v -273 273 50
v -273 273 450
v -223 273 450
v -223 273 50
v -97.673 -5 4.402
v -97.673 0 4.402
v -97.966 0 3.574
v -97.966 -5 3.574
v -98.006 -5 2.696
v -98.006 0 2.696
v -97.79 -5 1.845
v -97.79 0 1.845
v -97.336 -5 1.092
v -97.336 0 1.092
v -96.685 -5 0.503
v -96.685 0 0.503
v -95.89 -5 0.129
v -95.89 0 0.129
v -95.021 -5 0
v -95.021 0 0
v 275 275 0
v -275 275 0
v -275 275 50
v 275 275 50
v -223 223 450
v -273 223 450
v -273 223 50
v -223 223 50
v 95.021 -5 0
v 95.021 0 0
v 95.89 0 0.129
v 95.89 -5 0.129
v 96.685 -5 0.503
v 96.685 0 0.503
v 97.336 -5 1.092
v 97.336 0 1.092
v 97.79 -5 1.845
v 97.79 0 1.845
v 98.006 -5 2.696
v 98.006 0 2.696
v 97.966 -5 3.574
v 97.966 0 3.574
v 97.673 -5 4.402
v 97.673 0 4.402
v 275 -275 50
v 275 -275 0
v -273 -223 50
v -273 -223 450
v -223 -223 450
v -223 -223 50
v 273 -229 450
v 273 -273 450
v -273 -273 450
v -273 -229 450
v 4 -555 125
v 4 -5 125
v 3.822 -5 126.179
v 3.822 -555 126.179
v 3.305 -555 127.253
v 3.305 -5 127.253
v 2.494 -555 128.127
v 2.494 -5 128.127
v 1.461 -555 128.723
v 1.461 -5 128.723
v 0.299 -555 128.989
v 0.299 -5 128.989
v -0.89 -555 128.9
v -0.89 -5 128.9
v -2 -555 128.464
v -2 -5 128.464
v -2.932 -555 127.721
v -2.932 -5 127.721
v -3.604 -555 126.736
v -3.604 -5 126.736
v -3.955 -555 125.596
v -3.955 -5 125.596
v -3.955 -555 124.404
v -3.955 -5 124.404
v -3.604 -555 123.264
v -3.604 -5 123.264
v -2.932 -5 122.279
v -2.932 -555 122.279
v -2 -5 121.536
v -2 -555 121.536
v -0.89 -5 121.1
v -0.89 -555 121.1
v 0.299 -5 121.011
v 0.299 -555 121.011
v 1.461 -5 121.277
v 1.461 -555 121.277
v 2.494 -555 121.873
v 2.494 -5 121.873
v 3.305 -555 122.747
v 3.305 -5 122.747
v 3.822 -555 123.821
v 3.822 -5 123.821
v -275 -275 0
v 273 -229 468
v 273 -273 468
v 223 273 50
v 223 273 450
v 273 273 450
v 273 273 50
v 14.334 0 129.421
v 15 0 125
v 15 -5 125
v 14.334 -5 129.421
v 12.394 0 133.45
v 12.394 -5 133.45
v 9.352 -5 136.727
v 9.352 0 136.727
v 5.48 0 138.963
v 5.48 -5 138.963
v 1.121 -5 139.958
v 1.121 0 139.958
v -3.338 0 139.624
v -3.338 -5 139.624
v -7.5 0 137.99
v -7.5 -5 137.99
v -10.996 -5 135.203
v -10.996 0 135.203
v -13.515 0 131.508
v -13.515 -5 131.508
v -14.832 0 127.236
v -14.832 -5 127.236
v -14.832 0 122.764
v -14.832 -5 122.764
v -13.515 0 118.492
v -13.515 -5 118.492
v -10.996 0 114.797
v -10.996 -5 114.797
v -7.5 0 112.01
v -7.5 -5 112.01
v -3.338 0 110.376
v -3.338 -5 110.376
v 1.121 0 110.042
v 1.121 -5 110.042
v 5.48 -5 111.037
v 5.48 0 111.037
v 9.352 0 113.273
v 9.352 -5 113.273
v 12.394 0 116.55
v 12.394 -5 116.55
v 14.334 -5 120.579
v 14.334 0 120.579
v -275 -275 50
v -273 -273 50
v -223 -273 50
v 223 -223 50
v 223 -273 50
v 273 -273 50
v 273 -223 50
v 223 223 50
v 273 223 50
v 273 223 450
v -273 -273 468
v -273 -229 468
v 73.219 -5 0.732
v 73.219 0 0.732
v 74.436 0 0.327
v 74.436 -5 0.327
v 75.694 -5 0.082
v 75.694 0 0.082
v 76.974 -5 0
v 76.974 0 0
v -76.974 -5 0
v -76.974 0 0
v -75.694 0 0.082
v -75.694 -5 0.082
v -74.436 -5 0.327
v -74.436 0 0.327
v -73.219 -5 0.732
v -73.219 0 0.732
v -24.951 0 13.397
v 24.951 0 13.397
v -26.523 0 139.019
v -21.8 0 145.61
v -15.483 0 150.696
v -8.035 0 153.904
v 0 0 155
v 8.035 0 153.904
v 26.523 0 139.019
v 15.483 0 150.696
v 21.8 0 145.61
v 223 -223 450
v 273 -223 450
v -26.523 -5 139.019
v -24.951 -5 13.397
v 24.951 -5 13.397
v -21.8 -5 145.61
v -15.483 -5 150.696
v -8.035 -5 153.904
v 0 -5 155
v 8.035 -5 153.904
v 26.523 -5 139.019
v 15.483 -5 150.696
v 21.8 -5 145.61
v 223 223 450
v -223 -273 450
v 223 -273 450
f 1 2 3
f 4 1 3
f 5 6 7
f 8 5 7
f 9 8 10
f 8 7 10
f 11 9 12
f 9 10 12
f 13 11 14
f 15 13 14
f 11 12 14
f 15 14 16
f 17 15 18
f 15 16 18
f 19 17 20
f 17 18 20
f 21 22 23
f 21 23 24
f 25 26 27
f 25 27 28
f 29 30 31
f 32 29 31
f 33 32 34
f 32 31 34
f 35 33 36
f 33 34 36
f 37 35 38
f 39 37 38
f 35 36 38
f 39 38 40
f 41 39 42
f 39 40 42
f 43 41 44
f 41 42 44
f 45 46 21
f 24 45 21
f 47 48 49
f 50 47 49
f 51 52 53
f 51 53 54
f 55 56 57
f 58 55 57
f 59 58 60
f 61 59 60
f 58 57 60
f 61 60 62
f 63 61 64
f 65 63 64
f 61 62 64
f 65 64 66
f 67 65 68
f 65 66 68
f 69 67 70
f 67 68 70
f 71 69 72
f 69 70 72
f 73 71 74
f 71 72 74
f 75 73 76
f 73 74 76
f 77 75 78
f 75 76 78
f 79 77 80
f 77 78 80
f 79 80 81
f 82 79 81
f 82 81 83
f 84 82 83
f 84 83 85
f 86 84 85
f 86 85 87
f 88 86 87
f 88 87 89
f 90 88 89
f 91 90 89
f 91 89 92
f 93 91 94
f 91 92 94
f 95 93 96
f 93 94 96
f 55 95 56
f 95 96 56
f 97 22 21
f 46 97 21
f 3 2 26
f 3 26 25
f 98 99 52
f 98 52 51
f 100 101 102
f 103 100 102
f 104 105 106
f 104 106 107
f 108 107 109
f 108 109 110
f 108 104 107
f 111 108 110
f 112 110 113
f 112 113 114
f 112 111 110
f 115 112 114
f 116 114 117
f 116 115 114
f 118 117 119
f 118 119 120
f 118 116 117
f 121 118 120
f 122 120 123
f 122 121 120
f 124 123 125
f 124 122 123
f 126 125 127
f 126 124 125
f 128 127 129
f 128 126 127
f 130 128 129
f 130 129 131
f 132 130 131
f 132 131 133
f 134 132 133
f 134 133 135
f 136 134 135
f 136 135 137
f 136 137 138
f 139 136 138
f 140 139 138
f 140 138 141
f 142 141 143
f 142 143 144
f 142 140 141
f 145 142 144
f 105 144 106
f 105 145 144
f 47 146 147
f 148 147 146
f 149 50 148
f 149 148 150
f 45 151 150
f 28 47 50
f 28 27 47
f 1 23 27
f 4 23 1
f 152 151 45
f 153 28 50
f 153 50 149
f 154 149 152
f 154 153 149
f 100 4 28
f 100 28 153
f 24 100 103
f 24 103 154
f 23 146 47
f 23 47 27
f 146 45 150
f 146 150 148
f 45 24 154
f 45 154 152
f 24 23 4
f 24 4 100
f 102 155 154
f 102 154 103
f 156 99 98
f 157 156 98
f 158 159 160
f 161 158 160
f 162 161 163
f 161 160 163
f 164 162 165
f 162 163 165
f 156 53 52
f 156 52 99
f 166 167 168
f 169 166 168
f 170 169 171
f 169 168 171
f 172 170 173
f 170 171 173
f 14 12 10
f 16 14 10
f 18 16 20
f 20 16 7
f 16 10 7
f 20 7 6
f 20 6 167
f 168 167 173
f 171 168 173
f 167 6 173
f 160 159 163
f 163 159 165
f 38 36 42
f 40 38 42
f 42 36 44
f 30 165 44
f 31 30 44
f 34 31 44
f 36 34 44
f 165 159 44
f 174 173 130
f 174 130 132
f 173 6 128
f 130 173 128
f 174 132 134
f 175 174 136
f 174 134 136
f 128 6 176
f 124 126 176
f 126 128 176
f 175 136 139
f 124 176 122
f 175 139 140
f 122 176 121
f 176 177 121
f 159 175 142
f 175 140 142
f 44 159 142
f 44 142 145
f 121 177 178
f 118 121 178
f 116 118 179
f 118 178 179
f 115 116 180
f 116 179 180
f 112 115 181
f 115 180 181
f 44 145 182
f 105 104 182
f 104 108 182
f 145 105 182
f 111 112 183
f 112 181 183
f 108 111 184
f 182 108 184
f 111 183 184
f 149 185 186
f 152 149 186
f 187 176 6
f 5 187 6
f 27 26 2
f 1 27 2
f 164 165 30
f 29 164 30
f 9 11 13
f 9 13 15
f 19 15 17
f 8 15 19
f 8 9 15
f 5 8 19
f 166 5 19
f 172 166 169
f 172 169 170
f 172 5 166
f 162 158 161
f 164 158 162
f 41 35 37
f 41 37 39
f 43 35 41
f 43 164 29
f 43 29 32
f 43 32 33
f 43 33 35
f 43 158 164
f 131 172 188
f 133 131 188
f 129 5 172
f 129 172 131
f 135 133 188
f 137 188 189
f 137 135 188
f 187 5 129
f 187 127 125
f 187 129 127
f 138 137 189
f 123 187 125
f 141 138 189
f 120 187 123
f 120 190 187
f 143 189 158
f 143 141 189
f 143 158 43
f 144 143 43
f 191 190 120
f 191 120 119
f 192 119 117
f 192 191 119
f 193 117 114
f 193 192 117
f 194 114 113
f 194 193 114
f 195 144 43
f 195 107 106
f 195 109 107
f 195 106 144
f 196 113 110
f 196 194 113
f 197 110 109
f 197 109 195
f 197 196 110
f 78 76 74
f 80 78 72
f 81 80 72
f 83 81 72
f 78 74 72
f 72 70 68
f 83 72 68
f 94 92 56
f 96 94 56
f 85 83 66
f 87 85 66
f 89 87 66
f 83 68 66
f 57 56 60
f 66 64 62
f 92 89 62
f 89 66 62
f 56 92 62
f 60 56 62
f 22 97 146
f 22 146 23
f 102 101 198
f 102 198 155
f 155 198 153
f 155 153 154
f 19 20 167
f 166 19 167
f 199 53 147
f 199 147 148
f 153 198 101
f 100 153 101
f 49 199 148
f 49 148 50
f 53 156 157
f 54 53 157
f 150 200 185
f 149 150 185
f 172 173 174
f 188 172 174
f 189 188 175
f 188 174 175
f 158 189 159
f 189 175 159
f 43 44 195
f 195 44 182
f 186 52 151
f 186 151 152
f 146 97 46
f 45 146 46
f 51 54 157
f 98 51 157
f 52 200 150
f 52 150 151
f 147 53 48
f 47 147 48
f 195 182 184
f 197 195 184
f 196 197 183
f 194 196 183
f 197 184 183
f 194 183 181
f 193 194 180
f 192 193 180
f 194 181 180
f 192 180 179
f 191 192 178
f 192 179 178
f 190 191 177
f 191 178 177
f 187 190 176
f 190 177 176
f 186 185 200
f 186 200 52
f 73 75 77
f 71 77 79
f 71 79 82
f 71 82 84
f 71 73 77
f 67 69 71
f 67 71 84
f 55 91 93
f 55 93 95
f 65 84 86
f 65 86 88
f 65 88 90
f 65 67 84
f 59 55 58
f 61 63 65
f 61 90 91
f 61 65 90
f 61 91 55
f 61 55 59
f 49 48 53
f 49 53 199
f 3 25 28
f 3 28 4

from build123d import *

# Parameters (mm, degrees)
F0_W     = 550
F0_H     = 550
F0_W_2   = 50
F0_H_2   = 50
F1_DEPTH = 50
F2_DEPTH = 450
F3_W     = 44
F3_H     = 18
F4_DEPTH = 546
F5_R     = 15
F6_DEPTH = 5
F7_R     = 4
F8_DEPTH = 550


with BuildPart() as f1:
    # F0 (on Top) → F1 (new body)
    with BuildSketch(Plane.XY):
        Rectangle(F0_W, F0_H)
        with Locations((-248, -248)):
            Rectangle(F0_W_2, F0_H_2, mode=Mode.SUBTRACT)
        with Locations((248, -248)):
            Rectangle(F0_W_2, F0_H_2, mode=Mode.SUBTRACT)
        with Locations((-248, 248)):
            Rectangle(F0_W_2, F0_H_2, mode=Mode.SUBTRACT)
        with Locations((248, 248)):
            Rectangle(F0_W_2, F0_H_2, mode=Mode.SUBTRACT)
    extrude(amount=F1_DEPTH)

    # F0 (on Top) → F2 (join)
    with BuildSketch(Plane.XY):
        with Locations((-248, 248)):
            Rectangle(F0_W_2, F0_H_2)
        with Locations((248, 248)):
            Rectangle(F0_W_2, F0_H_2)
        with Locations((248, -248)):
            Rectangle(F0_W_2, F0_H_2)
        with Locations((-248, -248)):
            Rectangle(F0_W_2, F0_H_2)
    extrude(amount=F2_DEPTH)


with BuildPart() as f4:
    # F3 (on face) → F4 (new body)
    with BuildSketch(Plane.YZ.offset(273)):
        with Locations((-251, 459)):
            Rectangle(F3_W, F3_H)
    extrude(amount=-F4_DEPTH)


with BuildPart() as f6:
    # F5 (on Front) → F6 (new body)
    with BuildSketch(Plane.XZ):
        with BuildLine():
            Line((-26.523198, 139.018558), (-97.673445, 4.401856))
            ThreePointArc((-97.673445, 4.401856), (-97.590714, 1.451705), (-95.021125, 0))
            Line((-95.021125, 0), (-76.974022, 0))
            ThreePointArc((-76.974022, 0), (-75.061291, 0.184631), (-73.219191, 0.731707))
            ThreePointArc((-73.219191, 0.731707), (0, 15), (73.219191, 0.731707))
            ThreePointArc((73.219191, 0.731707), (75.061291, 0.184631), (76.974022, 0))
            Line((76.974022, 0), (95.021125, 0))
            ThreePointArc((95.021125, 0), (97.590714, 1.451705), (97.673445, 4.401856))
            Line((97.673445, 4.401856), (26.523198, 139.018558))
            ThreePointArc((26.523198, 139.018558), (0, 155), (-26.523198, 139.018558))
        make_face()
        with Locations((0, 125)):
            Circle(F5_R, mode=Mode.SUBTRACT)
    extrude(amount=F6_DEPTH)


with BuildPart() as f8:
    # F7 (on face) → F8 (new body)
    with BuildSketch(Plane.XZ.offset(5)):
        with Locations((0, 125)):
            Circle(F7_R)
    extrude(amount=F8_DEPTH)


solid = Compound([f1.part, f4.part, f6.part, f8.part])
